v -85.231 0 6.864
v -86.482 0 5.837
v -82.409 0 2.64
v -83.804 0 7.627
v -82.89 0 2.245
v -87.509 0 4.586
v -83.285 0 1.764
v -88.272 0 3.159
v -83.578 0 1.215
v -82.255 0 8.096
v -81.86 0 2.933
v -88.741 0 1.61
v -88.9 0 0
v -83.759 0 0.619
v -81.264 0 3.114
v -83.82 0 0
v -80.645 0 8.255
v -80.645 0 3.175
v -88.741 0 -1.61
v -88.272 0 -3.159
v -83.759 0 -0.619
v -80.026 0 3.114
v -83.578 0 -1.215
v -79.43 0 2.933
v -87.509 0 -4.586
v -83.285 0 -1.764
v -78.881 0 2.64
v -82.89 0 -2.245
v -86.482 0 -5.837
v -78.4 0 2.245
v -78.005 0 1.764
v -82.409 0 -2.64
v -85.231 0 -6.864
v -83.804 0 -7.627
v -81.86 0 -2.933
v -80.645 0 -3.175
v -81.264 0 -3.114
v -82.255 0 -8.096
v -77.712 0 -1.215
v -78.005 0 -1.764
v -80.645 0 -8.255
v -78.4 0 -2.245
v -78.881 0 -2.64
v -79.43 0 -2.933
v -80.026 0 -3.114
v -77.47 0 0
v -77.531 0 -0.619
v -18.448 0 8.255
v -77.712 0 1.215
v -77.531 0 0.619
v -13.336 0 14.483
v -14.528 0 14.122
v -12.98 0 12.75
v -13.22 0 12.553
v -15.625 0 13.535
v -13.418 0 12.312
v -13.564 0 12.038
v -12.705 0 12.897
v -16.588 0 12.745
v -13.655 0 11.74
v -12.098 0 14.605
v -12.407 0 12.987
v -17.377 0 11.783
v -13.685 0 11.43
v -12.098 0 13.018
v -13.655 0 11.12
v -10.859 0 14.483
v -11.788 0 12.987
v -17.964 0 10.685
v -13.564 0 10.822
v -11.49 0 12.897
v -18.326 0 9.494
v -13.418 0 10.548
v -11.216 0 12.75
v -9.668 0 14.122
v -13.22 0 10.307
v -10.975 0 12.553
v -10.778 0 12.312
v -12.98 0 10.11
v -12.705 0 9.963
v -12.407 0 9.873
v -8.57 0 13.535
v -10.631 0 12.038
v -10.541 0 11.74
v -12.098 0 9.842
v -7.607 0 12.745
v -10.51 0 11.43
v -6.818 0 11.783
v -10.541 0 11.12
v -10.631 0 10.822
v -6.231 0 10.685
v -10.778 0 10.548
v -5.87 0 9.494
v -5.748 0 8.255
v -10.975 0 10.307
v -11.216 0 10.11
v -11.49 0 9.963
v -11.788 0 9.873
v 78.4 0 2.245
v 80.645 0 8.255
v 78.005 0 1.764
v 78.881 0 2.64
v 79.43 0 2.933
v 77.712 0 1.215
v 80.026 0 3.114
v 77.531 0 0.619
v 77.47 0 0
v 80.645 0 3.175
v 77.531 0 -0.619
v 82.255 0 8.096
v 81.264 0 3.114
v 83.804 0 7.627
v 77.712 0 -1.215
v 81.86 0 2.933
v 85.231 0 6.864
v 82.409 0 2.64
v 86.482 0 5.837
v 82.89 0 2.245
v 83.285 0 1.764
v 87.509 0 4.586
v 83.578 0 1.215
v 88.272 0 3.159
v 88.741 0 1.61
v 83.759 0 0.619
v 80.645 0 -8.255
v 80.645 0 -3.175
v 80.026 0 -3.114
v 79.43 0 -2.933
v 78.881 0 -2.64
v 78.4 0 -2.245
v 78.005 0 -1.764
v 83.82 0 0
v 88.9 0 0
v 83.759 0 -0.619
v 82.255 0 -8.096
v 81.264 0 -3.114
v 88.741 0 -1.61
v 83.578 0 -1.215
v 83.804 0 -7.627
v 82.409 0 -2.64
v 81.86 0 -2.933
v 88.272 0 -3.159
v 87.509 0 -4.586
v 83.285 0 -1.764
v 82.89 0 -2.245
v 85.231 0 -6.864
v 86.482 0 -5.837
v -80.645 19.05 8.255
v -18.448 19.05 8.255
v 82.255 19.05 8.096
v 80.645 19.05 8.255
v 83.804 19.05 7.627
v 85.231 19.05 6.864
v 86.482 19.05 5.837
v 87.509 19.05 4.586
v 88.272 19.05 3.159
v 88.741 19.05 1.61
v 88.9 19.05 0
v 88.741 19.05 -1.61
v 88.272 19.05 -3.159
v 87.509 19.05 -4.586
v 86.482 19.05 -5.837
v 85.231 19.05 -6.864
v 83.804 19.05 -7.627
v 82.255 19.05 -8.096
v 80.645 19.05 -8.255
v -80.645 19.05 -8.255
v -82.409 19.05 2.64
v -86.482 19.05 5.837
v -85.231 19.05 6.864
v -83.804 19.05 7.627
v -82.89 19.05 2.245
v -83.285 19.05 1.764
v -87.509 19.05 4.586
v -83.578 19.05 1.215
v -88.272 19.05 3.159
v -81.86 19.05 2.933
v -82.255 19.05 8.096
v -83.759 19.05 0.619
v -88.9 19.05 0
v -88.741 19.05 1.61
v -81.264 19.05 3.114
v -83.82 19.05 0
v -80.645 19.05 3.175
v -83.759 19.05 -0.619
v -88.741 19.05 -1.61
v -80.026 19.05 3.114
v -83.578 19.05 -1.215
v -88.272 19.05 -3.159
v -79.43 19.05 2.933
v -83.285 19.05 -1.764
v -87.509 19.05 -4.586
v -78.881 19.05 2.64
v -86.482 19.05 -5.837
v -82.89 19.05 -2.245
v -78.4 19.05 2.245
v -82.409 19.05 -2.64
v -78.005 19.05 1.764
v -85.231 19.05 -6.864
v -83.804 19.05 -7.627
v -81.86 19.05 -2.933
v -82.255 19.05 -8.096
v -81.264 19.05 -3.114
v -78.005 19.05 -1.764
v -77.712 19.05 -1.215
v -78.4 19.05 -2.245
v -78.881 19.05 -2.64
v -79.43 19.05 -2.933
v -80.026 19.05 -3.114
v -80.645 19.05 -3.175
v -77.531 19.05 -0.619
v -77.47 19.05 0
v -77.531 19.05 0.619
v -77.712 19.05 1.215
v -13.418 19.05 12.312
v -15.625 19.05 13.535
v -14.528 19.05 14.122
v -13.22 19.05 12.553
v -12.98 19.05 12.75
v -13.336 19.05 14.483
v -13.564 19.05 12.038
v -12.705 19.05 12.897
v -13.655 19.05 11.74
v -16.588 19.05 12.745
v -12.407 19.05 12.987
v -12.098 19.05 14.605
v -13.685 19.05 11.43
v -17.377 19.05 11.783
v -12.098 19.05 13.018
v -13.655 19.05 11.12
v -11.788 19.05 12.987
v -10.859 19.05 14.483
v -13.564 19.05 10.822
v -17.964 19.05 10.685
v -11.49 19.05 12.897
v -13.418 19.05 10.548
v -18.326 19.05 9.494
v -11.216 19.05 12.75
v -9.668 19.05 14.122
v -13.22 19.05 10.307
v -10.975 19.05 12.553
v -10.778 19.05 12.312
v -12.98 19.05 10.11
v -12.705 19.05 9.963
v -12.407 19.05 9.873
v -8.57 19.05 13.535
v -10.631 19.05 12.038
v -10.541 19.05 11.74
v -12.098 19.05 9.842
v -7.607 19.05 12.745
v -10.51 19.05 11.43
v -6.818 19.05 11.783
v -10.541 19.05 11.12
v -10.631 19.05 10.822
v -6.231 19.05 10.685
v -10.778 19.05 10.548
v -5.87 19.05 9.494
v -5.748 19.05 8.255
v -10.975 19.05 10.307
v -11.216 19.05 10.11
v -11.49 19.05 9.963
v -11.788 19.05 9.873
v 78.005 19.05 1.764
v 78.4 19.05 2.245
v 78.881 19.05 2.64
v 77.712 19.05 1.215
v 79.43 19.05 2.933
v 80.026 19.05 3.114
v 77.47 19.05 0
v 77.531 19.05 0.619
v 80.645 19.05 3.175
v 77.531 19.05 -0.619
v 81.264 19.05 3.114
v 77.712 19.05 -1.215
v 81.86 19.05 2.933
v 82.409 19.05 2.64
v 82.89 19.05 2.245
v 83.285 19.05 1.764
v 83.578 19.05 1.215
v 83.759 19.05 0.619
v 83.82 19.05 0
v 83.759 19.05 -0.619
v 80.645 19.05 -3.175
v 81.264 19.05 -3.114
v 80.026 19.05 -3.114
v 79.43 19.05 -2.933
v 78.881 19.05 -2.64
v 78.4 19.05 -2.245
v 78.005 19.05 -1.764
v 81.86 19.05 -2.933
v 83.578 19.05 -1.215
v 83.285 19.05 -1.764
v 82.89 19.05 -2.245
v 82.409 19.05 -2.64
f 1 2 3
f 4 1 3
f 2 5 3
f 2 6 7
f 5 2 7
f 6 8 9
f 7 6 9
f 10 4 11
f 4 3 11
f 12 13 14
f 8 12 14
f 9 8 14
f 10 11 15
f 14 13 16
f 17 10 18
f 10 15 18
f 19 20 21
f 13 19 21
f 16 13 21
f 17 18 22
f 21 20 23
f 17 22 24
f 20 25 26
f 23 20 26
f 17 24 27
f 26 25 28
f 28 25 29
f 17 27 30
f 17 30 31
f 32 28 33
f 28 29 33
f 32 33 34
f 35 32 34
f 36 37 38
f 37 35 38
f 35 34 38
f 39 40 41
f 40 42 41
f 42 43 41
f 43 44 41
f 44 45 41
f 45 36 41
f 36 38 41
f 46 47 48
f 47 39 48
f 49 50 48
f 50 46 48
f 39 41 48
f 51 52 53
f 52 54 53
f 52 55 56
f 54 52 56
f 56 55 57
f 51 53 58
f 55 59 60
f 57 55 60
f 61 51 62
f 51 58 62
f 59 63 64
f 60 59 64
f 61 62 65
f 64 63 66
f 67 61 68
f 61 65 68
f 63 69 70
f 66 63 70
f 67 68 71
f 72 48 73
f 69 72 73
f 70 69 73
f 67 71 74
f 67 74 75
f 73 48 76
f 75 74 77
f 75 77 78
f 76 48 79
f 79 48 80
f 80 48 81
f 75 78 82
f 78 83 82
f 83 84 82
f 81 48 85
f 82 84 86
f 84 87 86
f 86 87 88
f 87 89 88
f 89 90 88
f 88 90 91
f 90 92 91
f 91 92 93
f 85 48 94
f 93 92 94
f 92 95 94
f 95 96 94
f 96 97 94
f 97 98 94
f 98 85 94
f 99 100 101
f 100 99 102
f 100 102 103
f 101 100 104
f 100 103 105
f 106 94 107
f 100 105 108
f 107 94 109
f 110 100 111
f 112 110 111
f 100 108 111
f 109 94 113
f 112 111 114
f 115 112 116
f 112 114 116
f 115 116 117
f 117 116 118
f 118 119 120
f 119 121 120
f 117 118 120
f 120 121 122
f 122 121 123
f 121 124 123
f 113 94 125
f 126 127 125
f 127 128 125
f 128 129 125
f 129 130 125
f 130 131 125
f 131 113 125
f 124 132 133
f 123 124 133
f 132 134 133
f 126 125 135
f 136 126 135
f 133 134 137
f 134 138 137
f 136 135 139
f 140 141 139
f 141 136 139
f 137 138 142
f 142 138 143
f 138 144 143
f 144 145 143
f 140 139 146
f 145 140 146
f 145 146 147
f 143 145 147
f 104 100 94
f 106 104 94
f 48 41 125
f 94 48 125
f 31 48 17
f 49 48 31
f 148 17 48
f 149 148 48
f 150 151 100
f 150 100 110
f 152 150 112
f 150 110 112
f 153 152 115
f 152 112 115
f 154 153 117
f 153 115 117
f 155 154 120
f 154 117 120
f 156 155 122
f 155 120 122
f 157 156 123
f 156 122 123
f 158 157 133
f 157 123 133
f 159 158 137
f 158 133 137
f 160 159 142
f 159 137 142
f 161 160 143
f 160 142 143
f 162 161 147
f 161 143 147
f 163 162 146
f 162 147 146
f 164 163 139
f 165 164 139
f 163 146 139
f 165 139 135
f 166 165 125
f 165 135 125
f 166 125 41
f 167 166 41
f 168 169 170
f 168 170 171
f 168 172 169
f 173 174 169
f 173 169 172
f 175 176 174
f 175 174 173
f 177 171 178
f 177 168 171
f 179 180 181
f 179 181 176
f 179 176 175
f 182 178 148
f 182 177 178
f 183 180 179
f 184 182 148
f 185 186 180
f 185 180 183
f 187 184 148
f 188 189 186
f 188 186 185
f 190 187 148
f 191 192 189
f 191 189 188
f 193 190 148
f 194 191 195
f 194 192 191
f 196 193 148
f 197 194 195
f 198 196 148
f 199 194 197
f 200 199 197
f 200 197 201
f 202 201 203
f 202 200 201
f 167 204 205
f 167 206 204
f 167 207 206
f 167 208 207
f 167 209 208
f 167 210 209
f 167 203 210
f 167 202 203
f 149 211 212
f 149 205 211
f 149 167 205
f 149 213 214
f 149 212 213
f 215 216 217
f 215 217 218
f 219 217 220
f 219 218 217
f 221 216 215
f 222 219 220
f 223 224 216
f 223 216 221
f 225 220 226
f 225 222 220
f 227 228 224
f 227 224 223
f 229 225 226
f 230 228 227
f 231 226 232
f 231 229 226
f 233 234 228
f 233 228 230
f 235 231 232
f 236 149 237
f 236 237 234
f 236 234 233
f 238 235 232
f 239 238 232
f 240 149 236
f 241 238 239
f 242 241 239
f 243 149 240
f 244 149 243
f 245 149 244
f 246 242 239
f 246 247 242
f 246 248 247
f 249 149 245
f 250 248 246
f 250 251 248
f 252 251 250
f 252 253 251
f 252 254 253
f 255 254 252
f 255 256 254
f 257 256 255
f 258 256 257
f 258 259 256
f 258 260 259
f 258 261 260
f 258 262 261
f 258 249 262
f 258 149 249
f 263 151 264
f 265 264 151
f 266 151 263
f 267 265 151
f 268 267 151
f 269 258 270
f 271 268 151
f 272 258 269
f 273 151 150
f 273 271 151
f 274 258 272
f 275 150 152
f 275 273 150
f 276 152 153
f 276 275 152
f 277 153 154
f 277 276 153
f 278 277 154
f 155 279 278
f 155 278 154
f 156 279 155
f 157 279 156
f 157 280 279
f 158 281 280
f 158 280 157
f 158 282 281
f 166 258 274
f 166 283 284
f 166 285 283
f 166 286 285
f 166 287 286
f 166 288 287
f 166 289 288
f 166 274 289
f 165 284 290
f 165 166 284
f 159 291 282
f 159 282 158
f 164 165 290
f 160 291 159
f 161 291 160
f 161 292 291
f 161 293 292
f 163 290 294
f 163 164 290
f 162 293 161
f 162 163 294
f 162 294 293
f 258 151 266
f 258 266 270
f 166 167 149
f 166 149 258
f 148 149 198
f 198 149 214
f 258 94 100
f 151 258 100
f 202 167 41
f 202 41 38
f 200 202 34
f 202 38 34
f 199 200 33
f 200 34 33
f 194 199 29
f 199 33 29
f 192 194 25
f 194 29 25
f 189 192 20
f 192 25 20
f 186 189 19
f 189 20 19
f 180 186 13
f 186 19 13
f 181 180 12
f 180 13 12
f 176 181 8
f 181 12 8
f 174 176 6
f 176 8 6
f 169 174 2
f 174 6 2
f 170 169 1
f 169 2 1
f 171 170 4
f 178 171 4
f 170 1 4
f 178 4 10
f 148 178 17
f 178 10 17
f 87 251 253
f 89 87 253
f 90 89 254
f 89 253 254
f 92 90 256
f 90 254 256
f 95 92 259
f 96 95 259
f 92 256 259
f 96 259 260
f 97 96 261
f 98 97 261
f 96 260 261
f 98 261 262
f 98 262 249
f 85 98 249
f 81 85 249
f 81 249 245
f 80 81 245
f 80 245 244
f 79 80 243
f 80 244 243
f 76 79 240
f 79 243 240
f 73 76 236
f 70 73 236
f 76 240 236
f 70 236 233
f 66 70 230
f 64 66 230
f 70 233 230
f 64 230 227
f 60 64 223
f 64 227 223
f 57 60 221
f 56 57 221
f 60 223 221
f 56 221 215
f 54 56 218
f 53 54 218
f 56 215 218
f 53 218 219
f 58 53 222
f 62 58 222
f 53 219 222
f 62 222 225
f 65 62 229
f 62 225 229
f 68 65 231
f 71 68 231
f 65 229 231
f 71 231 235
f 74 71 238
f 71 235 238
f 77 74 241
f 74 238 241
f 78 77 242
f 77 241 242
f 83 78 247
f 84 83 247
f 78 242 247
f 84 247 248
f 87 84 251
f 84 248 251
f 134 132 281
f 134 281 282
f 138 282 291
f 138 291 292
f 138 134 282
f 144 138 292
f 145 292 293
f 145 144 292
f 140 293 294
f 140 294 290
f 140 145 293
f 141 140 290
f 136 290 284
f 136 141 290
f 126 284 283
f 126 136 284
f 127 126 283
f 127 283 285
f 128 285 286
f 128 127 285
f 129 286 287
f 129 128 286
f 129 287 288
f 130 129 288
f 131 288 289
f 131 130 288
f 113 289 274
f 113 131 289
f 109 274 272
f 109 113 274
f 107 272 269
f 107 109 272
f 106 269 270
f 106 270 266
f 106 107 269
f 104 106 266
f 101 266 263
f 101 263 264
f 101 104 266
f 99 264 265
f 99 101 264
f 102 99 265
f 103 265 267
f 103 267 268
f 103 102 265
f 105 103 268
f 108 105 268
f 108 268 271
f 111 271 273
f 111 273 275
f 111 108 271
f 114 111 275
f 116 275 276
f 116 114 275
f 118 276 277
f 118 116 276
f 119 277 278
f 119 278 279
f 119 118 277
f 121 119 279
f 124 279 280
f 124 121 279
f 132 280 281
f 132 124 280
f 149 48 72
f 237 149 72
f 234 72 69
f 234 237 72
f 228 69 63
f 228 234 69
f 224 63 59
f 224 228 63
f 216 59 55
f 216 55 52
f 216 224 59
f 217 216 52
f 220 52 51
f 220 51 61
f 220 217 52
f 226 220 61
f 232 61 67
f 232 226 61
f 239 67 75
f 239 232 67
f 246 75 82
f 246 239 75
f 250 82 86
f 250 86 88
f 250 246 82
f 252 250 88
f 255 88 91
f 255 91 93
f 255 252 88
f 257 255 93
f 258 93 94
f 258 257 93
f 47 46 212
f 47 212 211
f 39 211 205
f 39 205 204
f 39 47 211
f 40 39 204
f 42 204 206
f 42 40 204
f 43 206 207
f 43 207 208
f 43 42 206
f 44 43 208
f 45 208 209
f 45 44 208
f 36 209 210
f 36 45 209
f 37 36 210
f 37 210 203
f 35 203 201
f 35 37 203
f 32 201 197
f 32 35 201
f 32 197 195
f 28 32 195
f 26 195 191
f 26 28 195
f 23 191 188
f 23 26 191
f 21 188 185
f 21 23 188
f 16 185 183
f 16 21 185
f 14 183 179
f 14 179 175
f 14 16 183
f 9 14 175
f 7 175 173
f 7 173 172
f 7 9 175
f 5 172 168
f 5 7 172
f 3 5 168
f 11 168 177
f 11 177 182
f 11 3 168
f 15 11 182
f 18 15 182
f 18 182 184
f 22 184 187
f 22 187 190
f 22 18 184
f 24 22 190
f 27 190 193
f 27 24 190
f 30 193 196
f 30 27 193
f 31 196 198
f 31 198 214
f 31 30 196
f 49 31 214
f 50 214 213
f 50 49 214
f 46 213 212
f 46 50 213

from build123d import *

# Parameters (mm, degrees)
SKETCH1_R           = 3.175
BOSS_EXTRUDE1_DEPTH = 19.05
SKETCH2_R           = 6.35
SKETCH2_R_2         = 1.5875
BOSS_EXTRUDE2_DEPTH = 19.05


with BuildPart() as part:
    # Sketch1 → Boss-Extrude1 (new body)
    with BuildSketch(Plane(origin=(0, 0, 0), x_dir=(1, 0, 0), z_dir=(0, 1, 0))):
        with BuildLine():
            Line((-80.645, -8.255), (80.645, -8.255))
            ThreePointArc((80.645, -8.255), (88.9, 0), (80.645, 8.255))
            Line((80.645, 8.255), (-80.645, 8.255))
            ThreePointArc((-80.645, 8.255), (-88.9, 0), (-80.645, -8.255))
        make_face()
        with Locations((-80.645, 0)):
            Circle(SKETCH1_R, mode=Mode.SUBTRACT)
        with Locations((80.645, 0)):
            Circle(SKETCH1_R, mode=Mode.SUBTRACT)
    extrude(amount=BOSS_EXTRUDE1_DEPTH)

    # Sketch2 → Boss-Extrude2 (add)
    with BuildSketch(Plane(origin=(0, 19.05, 0), x_dir=(1, 0, 0), z_dir=(0, 1, 0))):
        with Locations((-12.0976136, -8.255)):
            Circle(SKETCH2_R)
        with Locations((-12.0976136, -11.43)):
            Circle(SKETCH2_R_2, mode=Mode.SUBTRACT)
    extrude(amount=-BOSS_EXTRUDE2_DEPTH)


solid = part.part
